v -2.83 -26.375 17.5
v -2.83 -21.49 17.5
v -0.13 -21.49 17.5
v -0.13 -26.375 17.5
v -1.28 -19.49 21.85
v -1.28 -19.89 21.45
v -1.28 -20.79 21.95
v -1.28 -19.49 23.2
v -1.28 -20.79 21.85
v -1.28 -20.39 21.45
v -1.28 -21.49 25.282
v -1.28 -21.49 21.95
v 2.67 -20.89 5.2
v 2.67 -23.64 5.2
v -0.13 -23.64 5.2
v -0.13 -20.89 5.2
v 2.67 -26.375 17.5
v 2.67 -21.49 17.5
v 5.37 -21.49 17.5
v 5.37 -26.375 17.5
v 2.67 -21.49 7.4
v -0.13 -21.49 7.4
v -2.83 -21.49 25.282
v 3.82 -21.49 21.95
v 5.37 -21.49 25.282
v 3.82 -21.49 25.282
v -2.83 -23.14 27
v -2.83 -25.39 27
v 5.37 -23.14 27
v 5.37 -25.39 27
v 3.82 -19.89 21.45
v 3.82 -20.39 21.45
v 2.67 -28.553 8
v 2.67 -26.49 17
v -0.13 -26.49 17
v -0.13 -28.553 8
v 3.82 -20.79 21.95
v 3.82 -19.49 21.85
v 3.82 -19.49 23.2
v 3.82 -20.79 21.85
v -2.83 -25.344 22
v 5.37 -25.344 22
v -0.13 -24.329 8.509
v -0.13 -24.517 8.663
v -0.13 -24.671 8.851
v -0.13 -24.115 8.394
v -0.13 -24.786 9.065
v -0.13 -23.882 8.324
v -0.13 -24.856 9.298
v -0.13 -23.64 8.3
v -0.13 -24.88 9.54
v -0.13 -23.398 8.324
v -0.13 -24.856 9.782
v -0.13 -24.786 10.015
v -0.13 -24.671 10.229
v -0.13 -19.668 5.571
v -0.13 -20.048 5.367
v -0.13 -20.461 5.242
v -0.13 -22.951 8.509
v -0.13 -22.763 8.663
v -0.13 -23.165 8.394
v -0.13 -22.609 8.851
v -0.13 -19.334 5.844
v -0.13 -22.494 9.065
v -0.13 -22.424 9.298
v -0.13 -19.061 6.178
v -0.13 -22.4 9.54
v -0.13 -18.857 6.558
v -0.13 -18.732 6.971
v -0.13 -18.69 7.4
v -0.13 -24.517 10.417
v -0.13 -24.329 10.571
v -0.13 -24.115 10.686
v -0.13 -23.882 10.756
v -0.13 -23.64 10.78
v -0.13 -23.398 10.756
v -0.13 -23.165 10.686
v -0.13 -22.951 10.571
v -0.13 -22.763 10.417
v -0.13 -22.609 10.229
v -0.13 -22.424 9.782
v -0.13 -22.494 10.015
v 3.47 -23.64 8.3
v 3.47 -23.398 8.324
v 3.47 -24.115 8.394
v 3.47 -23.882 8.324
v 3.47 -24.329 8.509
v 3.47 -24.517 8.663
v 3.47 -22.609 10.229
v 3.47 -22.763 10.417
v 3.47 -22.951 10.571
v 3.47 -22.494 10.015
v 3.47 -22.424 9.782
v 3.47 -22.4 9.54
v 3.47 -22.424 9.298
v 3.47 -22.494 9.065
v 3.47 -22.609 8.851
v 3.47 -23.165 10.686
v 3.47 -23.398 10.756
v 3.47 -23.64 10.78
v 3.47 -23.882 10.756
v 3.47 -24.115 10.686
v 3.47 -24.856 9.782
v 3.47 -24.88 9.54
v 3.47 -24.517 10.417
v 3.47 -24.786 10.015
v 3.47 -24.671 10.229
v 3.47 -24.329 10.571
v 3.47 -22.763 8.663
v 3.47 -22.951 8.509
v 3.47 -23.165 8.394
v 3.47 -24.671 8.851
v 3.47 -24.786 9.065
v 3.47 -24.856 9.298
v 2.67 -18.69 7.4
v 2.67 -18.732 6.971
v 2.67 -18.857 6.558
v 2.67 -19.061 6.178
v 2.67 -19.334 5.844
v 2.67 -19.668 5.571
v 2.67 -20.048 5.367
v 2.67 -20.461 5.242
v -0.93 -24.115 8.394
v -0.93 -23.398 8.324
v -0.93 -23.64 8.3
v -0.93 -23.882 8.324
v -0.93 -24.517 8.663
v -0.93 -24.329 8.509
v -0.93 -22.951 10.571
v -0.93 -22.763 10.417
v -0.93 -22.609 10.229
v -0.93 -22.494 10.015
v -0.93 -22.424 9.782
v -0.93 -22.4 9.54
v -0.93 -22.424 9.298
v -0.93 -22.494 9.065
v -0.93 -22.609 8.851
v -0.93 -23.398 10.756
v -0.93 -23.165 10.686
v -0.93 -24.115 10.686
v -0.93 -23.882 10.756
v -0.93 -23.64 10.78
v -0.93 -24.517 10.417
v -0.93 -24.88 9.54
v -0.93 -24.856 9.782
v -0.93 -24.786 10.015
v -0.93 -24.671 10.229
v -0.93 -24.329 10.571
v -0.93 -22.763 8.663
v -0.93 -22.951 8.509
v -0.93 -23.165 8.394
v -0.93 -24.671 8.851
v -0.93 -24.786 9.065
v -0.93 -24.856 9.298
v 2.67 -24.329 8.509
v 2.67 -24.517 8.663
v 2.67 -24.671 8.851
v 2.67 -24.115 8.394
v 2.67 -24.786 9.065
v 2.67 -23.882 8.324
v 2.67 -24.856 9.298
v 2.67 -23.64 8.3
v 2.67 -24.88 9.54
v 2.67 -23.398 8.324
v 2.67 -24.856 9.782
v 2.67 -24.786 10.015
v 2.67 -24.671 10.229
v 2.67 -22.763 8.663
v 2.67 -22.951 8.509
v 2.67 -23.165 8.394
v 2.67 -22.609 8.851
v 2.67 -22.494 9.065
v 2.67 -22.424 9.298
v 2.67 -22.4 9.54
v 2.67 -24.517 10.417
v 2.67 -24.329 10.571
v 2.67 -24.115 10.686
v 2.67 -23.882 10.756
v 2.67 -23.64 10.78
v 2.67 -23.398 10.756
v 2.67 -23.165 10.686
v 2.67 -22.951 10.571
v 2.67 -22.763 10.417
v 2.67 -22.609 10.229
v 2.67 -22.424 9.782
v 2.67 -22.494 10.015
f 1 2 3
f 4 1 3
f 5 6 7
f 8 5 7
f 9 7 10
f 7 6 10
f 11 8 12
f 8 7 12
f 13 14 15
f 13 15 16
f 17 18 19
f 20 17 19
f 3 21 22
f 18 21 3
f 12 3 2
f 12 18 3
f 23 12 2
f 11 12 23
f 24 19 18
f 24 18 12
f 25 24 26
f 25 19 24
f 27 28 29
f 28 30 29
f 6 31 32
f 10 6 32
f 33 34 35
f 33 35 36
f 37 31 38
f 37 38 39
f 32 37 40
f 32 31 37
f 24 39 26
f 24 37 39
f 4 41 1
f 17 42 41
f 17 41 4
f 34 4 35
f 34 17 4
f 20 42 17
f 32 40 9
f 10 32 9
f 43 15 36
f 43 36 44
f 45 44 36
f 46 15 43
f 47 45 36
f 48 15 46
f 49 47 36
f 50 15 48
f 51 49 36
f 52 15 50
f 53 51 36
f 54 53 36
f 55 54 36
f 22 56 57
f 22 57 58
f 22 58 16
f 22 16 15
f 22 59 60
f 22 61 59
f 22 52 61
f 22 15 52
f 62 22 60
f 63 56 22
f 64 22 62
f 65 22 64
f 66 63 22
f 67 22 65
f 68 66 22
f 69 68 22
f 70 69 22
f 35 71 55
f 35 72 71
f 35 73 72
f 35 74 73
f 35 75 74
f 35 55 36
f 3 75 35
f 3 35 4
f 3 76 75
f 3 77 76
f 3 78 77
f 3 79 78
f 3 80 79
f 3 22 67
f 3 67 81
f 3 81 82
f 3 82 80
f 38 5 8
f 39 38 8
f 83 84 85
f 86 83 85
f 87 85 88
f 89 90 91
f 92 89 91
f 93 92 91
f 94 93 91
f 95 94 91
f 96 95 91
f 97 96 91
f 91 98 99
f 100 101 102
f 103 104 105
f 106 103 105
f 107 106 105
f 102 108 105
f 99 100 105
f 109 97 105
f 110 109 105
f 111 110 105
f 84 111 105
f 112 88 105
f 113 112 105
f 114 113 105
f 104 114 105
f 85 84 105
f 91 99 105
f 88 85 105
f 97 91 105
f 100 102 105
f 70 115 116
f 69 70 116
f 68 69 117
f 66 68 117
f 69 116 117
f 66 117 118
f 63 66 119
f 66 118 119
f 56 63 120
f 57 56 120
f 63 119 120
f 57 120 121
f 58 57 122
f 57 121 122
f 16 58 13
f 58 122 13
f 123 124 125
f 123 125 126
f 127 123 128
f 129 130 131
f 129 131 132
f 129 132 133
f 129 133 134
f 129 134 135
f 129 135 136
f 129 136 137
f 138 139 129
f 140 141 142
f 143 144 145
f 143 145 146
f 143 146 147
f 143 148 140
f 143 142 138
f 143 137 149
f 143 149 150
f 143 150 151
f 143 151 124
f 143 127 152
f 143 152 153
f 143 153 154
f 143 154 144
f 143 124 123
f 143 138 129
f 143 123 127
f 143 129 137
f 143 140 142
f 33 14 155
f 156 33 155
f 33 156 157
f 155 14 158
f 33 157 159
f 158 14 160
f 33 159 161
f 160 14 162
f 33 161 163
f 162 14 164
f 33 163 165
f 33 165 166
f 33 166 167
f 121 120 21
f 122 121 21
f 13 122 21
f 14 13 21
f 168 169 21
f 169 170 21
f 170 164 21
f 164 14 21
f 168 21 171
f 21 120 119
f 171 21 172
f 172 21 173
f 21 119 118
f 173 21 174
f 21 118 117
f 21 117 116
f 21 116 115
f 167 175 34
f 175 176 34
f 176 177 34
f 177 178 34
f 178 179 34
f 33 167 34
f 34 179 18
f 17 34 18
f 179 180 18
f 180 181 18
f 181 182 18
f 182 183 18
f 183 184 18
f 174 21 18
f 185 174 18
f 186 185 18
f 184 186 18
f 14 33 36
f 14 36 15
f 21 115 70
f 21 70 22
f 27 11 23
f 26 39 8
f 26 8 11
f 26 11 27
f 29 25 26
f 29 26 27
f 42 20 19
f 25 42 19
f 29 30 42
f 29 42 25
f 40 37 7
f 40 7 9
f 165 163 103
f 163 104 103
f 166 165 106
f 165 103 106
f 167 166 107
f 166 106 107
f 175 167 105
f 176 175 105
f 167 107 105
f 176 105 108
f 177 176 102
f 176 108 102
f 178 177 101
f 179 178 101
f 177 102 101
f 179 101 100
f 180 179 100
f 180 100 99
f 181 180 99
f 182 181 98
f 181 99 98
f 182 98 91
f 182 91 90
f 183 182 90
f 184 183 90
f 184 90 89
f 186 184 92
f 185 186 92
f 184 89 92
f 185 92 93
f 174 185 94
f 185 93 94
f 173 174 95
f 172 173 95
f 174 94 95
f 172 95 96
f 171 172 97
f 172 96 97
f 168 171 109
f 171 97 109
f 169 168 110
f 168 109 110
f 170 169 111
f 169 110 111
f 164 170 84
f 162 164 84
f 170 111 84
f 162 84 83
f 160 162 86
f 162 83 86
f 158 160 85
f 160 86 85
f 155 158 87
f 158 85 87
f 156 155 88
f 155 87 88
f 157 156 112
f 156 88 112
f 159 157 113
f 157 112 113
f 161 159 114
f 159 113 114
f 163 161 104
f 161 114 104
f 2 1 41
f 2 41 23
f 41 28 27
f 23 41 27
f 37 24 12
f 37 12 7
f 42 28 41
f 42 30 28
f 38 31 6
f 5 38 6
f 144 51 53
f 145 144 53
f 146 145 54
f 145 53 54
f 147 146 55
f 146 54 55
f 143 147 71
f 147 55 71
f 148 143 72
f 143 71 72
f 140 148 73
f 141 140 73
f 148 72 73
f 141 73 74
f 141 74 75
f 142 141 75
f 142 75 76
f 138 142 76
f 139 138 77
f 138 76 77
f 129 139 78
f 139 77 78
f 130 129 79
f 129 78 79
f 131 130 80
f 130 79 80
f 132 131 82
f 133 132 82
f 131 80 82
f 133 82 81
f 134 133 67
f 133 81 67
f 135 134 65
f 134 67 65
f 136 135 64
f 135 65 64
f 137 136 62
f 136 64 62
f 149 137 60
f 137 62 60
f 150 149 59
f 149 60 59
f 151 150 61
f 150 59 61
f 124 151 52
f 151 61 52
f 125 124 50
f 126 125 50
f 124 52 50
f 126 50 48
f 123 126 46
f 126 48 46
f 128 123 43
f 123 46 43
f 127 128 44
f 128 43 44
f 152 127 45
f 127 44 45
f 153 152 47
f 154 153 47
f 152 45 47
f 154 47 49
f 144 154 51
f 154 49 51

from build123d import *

# Parameters (mm, degrees)
PAD002_DEPTH    = 4.1
SKETCH017_W     = 2.7
SKETCH017_H     = 13
POCKET011_DEPTH = 10.7735
SKETCH018_W     = 1.55
SKETCH018_H     = 2
POCKET012_DEPTH = 27.001
SKETCH019_R     = 1.24
PAD003_DEPTH    = 2.2
CHAMFER001_SIZE = 0.4


with BuildPart() as body003:
    # Sketch016 (on DatumPlane) → Pad002 (new body, symmetric)
    with BuildSketch(Plane.YZ.offset(1.27)):
        with BuildLine():
            Line((0.91, 7.4), (3.71, 7.4))
            Line((3.71, 7.4), (3.71, 21.95))
            Line((3.71, 21.95), (3.01, 21.95))
            Line((3.01, 21.95), (3.01, 21.45))
            Line((1.71, 21.45), (3.01, 21.45))
            Line((1.71, 21.45), (1.71, 23.2))
            Line((1.71, 23.2), (5.36, 27))
            Line((7.61, 27), (5.36, 27))
            Line((7.61, 27), (7.564167, 22))
            Line((7.564167, 22), (8.71, 17))
            Line((8.71, 17), (10.7725, 8))
            Line((10.7725, 8), (5.86, 5.2))
            Line((5.86, 5.2), (3.11, 5.2))
            ThreePointArc((0.91, 7.4), (1.554365, 5.844365), (3.11, 5.2))
        make_face()
    extrude(amount=PAD002_DEPTH, both=True)

    # Sketch017 → Pocket011 (cut, through all)
    with BuildSketch(Plane.XZ):
        with Locations((4.02, 11)):
            Rectangle(SKETCH017_W, SKETCH017_H)
        with Locations((-1.48, 11)):
            Rectangle(SKETCH017_W, SKETCH017_H)
    extrude(amount=-POCKET011_DEPTH, mode=Mode.SUBTRACT)

    # Sketch018 → Pocket012 (cut, through all)
    with BuildSketch(Plane.XY):
        with Locations((-2.055, 2.71)):
            Rectangle(SKETCH018_W, SKETCH018_H)
        with Locations((4.595, 2.71)):
            Rectangle(SKETCH018_W, SKETCH018_H)
    extrude(amount=POCKET012_DEPTH, mode=Mode.SUBTRACT)

    # Sketch019 (on DatumPlane) → Pad003 (join, symmetric)
    with BuildSketch(Plane.YZ.offset(1.27)):
        with Locations((5.86, 9.54)):
            Circle(SKETCH019_R)
    extrude(amount=PAD003_DEPTH, both=True)

    # Chamfer001
    chamfer001_edges = [body003.edges().sort_by_distance(p)[0] for p in [
        (1.27, 1.71, 21.45),
        (1.27, 3.01, 21.45),
    ]]
    chamfer(chamfer001_edges, length=CHAMFER001_SIZE)


with BuildPart() as part_mirroring:
    # Part__Mirroring: instance of Body003
    add(body003.part.mirror(Plane(origin=(0, -8.89, 0), x_dir=(1, 0, 0), z_dir=(0, 1, 0))))


solid = part_mirroring.part
